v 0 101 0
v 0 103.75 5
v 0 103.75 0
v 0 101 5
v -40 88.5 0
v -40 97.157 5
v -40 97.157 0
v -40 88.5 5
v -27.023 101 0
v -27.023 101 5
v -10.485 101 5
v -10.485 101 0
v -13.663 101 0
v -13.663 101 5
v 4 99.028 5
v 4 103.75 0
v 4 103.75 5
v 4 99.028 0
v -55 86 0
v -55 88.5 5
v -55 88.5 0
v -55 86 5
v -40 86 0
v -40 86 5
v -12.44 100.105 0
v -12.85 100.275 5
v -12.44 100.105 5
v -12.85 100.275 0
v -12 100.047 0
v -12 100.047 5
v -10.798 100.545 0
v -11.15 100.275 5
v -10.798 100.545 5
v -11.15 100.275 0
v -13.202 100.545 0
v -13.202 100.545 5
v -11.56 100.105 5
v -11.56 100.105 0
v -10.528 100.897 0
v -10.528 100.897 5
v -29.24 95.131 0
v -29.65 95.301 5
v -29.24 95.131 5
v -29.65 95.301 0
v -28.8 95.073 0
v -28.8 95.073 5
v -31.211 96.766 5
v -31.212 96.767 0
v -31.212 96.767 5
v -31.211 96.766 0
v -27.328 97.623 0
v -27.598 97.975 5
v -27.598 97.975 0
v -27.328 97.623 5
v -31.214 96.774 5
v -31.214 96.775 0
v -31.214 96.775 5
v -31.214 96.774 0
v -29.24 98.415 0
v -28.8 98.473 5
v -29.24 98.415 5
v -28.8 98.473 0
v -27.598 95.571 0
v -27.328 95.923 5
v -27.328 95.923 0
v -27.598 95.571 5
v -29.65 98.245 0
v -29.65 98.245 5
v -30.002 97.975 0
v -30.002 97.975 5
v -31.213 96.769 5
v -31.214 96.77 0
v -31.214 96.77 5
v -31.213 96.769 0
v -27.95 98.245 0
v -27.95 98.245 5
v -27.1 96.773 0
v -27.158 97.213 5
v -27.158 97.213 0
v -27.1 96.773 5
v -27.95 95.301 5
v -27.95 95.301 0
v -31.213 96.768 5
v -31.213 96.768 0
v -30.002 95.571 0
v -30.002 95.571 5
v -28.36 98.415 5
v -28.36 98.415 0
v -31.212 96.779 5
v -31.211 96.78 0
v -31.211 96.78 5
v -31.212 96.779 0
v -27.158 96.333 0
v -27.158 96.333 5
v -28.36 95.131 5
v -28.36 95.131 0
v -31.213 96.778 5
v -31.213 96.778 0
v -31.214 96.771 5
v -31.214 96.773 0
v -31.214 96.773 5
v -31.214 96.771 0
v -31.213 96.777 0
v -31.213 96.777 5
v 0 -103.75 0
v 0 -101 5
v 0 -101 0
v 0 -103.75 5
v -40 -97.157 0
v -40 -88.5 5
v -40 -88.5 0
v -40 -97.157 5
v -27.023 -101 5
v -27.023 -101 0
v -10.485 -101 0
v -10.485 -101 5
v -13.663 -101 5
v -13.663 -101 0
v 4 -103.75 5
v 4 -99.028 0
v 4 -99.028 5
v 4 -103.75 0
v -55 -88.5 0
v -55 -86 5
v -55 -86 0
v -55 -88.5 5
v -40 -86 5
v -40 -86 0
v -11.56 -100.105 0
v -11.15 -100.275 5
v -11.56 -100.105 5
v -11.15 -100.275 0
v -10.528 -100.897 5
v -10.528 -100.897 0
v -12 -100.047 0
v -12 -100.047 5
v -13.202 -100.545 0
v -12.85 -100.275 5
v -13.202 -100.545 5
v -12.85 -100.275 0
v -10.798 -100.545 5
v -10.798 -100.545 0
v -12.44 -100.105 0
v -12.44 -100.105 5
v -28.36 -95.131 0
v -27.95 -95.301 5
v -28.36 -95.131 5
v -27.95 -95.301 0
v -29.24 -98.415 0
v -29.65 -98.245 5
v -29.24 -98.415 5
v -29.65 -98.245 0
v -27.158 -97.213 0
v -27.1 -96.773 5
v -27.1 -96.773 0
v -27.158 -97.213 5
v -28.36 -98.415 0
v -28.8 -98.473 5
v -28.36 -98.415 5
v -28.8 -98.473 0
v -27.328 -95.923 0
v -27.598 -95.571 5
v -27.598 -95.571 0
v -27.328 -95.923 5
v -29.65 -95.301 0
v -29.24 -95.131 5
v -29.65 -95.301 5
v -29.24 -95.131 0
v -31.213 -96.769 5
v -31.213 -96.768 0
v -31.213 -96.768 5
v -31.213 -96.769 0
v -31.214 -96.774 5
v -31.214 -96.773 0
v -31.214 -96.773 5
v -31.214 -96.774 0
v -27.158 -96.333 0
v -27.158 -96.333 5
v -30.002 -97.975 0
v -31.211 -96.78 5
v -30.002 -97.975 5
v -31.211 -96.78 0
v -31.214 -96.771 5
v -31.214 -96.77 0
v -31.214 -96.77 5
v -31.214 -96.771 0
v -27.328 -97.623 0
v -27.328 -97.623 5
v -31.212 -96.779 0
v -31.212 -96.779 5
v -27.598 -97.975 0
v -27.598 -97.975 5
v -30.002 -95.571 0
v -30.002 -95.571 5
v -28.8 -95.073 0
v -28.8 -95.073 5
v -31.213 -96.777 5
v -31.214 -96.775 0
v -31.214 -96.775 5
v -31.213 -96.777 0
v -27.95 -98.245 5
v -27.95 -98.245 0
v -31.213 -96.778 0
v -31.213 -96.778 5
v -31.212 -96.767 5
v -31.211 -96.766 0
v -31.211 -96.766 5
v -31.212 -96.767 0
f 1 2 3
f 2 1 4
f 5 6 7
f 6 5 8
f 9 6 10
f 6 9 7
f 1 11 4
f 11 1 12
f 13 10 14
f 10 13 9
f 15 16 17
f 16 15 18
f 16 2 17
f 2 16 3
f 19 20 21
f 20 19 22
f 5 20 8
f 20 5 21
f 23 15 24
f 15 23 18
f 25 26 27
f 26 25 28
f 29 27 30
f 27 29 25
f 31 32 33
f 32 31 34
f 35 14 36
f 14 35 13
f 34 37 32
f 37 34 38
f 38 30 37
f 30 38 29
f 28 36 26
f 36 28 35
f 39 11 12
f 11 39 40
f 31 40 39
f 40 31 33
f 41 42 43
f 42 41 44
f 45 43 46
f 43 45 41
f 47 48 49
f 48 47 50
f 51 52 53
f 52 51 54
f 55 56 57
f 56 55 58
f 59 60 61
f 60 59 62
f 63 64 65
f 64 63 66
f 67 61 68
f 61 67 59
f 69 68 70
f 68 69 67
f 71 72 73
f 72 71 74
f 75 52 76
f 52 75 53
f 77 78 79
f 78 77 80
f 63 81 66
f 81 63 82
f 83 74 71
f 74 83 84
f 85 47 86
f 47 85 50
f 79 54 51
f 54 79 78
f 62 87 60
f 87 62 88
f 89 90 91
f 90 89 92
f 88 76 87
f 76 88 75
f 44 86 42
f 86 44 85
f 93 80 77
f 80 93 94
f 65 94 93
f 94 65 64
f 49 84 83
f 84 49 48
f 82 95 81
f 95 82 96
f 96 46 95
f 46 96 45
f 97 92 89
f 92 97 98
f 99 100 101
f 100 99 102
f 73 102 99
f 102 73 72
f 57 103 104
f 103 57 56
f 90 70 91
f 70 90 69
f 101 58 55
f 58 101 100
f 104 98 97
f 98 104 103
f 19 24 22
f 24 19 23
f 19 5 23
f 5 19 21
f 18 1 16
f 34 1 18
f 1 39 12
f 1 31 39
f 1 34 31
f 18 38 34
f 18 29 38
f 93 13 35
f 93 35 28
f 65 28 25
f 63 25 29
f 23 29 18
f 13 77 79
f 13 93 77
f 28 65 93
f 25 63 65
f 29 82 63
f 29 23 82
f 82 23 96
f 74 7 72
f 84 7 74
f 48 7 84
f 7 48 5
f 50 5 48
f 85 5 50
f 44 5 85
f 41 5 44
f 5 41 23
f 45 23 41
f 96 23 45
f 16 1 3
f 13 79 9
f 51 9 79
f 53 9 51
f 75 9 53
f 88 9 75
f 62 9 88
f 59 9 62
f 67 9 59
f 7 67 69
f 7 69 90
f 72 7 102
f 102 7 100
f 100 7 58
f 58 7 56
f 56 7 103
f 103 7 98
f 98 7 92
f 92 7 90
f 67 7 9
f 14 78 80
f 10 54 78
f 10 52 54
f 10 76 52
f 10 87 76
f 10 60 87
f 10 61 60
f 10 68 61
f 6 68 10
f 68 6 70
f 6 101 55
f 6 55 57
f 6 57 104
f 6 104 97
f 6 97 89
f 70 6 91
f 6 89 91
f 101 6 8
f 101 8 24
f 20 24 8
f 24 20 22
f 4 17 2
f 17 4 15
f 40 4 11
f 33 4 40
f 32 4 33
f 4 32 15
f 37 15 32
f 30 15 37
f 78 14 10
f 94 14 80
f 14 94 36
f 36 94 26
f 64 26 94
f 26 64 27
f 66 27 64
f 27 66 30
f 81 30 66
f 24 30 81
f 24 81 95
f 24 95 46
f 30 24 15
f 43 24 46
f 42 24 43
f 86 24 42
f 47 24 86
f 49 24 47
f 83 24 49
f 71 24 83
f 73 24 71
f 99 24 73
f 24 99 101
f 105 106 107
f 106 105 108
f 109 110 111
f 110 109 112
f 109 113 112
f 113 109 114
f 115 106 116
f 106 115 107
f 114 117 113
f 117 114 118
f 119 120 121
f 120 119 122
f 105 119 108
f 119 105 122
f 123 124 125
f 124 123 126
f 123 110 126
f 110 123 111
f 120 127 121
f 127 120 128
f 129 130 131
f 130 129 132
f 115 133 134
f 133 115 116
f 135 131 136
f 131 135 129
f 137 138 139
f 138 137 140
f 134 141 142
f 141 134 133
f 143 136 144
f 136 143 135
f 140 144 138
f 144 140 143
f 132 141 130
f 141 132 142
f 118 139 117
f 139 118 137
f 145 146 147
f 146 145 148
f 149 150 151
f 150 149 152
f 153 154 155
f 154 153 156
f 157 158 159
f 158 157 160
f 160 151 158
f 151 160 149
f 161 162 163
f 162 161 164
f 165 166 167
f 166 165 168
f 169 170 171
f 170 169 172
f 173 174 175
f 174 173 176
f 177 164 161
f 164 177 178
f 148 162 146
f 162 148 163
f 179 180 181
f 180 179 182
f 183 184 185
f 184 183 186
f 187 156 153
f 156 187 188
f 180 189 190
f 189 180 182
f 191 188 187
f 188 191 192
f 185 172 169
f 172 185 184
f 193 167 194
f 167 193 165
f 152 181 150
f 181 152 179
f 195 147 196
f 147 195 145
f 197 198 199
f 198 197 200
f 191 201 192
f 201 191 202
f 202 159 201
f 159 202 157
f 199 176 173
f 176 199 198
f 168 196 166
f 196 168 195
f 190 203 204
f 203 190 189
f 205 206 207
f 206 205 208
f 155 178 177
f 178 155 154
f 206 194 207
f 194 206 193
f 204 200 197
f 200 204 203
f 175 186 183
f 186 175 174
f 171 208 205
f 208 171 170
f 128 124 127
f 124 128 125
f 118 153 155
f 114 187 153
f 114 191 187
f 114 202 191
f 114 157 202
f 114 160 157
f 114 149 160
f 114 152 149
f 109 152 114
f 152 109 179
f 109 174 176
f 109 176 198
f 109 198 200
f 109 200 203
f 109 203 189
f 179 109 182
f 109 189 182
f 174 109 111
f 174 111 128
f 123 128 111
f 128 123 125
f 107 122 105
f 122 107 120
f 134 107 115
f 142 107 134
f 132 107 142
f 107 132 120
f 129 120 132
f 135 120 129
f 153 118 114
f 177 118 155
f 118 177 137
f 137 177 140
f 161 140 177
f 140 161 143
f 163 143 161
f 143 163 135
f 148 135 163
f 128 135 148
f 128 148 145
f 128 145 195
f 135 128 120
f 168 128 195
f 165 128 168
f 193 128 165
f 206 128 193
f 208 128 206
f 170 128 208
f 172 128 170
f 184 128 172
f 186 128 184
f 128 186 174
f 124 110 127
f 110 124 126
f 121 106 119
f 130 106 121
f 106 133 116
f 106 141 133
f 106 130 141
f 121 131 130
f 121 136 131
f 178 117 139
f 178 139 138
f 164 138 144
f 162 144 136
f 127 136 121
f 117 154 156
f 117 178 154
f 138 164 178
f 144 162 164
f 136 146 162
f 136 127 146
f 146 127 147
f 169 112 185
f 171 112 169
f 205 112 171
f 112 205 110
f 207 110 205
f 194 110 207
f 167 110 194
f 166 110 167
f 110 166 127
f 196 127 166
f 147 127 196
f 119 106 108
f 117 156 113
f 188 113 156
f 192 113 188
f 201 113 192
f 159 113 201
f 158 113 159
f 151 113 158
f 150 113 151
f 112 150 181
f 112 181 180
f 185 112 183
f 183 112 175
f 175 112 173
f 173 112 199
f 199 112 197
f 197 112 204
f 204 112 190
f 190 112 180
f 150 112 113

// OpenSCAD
// =====================================================================
//  BIOMÜLL-TRICHTER – MITTELTEIL für die Trichterhälften VERSION 1
//  (gleich dicke Wand, Schraublöcher an den alten Positionen, Eimerlänge 278)
// =====================================================================
//  Das Mittelteil wird je Längsseite zwischen die beiden Trichterhälften
//  geschraubt und verlängert den Trichter um "mittelteil". Profil, Schräge,
//  Kragen, Haltekragen, Lasche und Schraublöcher sind exakt aus der
//  Original-Konstruktion (biomuell_system.scad, Stand 16.10.2026) abgeleitet.
//
//  Ausgabe: "stueck = -1" beide Mittelteile, 0 / 1 = einzeln (druckfertig:
//  Profil flach aufs Bett, Schraublöcher senkrecht). Zweimal drucken bzw.
//  beide Stücke ausgeben – sie sind spiegelgleich.
//
//  Verschraubung: M3 x 20 (bei 5 mm), Länge siehe ECHO.
//  Hinweis: Bei Version 1 sitzt das obere Loch jeder Lasche teilweise
//  außerhalb der Lasche (angeschnitten). Das Mittelteil hat die Löcher an
//  denselben Stellen, damit sie fluchten. Wer das obere Loch nicht nutzt,
//  schraubt nur durch das untere.
// =====================================================================

/* [Mittelteil] */
// Dicke des Mittelteils = Verlängerung des Trichters (mm)
mittelteil = 5;
// -1 = beide, 0 = Längsseite +y, 1 = Längsseite -y
stueck = -1;
// obere (angeschnittene) Löcher weglassen
obere_loecher = true;

/* [Eimer und Trichter – Werte der Version 1, nicht ändern] */
eimer_l = 278;
eimer_b = 210;
eimer_gerade_l = 240;
eimer_gerade_b = 170;
absatz = 3;
platte_l = 206;
platte_b = 166;
platte_fase = 16;
trichter_tiefe = 40;
oeffnung_spiel = 3;
kragen_unten_h = 15;
wand = 2.5;
kragen_t = 4;
flansch_spiel = 1.25;
trichter_spiel = 1.0;
rippe_h = 8;
rippe_t = 5;
schraube_d = 3.4;

/* [Hidden] */
$fn = 48;
EPS = 0.01;

function okt(o) = let(hx = o[0], hy = o[1], cx = o[2], cy = o[3])
    [[-hx + cx, -hy], [hx - cx, -hy], [hx, -hy + cy], [hx, hy - cy],
     [hx - cx, hy], [-hx + cx, hy], [-hx, hy - cy], [-hx, -hy + cy]];
function okt_off(o, d) = let(
    hx = o[0] - d, hy = o[1] - d, cx = o[2], cy = o[3], s = sqrt(cx * cx + cy * cy),
    k = (cy * o[0] + cx * o[1] - cx * cy) / s - d,
    xa = (k * s - cx * hy) / cy, yb = (k * s - cy * hx) / cx)
    [hx, hy, hx - xa, hy - yb];
function okt_k(o) = (o[3] * o[0] + o[2] * o[1] - o[2] * o[3]) / sqrt(o[2] * o[2] + o[3] * o[3]);
module okt_poly(o) polygon(okt(o));
module okt_scheibe(o, z) translate([0, 0, z]) linear_extrude(EPS) okt_poly(o);
module okt_prisma(o, z0, z1) translate([0, 0, z0]) linear_extrude(z1 - z0) okt_poly(o);

L2 = platte_l / 2;
W2 = platte_b / 2;
RIM = [eimer_l / 2, eimer_b / 2, (eimer_l - eimer_gerade_l) / 2, (eimer_b - eimer_gerade_b) / 2];
T_TOP = okt_off(RIM, absatz + trichter_spiel);
RATIO = T_TOP[3] / T_TOP[2];
LIP = [L2 + oeffnung_spiel, W2 + oeffnung_spiel, platte_fase, platte_fase * RATIO];
ALPHA_X = atan(trichter_tiefe / (T_TOP[0] - LIP[0]));
ALPHA_Y = atan(trichter_tiefe / (T_TOP[1] - LIP[1]));
ALPHA_C = atan(trichter_tiefe / (okt_k(T_TOP) - okt_k(LIP)));
ALPHA_MIN = min(ALPHA_X, ALPHA_Y, ALPHA_C);
DELTA = wand / sin(ALPHA_MIN);
T_BOT = okt_off(LIP, -DELTA);
function o_at(z) = T_TOP + (T_TOP - T_BOT) * (z / trichter_tiefe);
function fin(z) = okt_off(o_at(z), DELTA);

module tropfenloch2d(d) hull() { circle(d = d, $fn = 24); translate([0, -d / 2 * sqrt(2)]) circle(0.01); }

// Lasche an der Fuge x = 0 (wie Version 1)
module lasche(a, za, b, zb, clip) intersection() {
    translate([-rippe_t, -500, zb]) cube([2 * rippe_t, 1000, za - zb]);
    hull() { okt_scheibe(okt_off(a, -rippe_h), za - EPS); okt_scheibe(okt_off(b, -rippe_h), zb); }
    okt_prisma(clip, zb - 1, za + 1);
}
// Schraublöcher wie Version 1: bei 30 % und 72 % der Trichtertiefe
module lasche_loecher(a, za, b, zb) {
    zs = obere_loecher ? [za + 0.3 * (zb - za), za + 0.72 * (zb - za)] : [za + 0.72 * (zb - za)];
    for (s = [-1, 1], z = zs)
        let(yo = b[1] + (a[1] - b[1]) * (z - zb) / (za - zb))
        translate([0, s * (yo + rippe_h / 2 + 0.3), z]) rotate([90, 0, 90])
            linear_extrude(2 * rippe_t + 2, center = true) tropfenloch2d(schraube_d);
}

// Trichter Version 1 (ganz, ohne Teilung), Absatzebene z = 0
module trichter_v1() {
    difference() {
        union() {
            hull() { okt_scheibe(T_TOP, -EPS); okt_scheibe(T_BOT, -trichter_tiefe); }
            linear_extrude(kragen_t) okt_poly(okt_off(RIM, flansch_spiel));
            lasche(T_TOP, 0, T_BOT, -trichter_tiefe, T_TOP);
            okt_prisma(okt_off(LIP, -wand), -trichter_tiefe - kragen_unten_h, -trichter_tiefe + EPS);
        }
        okt_prisma(LIP, -trichter_tiefe - kragen_unten_h - 1, -trichter_tiefe + 1);
        intersection() {
            hull() { okt_scheibe(fin(kragen_t + 1), kragen_t + 1); okt_scheibe(fin(-trichter_tiefe - 1), -trichter_tiefe - 1); }
            okt_prisma(okt_off(RIM, flansch_spiel + 1.5), -trichter_tiefe - 2, kragen_t + 3);
        }
        lasche_loecher(T_TOP, 0, T_BOT, -trichter_tiefe);
    }
}

// Profil an der Fuge (gerader Bereich der Langseite) auf "mittelteil" verlängert
module mittelteil_roh() scale([mittelteil, 1, 1]) intersection() {
    trichter_v1();
    translate([-0.5, -500, -200]) cube([1, 1000, 400]);
}
module mittelteil_stueck(k) {
    s = k == 0 ? 1 : -1;
    translate([0, 0, mittelteil / 2]) rotate([0, 90, 0]) intersection() {
        mittelteil_roh();
        translate([-50, s > 0 ? 0 : -500, -200]) cube([100, 500, 400]);
    }
}

SCHRAUBE_L = let(n = 2 * rippe_t + mittelteil + 2.4 + 1.5) [for (l = [12, 16, 20, 25, 30, 35, 40]) if (l >= n) l][0];
echo(str("Mittelteil V1: ", mittelteil, " mm -> Trichter ", 2 * (RIM[0] - flansch_spiel) + mittelteil,
         " mm lang, Öffnung ", 2 * LIP[0] + mittelteil, " x ", 2 * LIP[1], " mm, Schrauben M3 x ", SCHRAUBE_L));
if (mittelteil <= 0) echo("WARNUNG: mittelteil muss größer als 0 sein.");

for (k = (stueck < 0 ? [0, 1] : [stueck])) mittelteil_stueck(k);
